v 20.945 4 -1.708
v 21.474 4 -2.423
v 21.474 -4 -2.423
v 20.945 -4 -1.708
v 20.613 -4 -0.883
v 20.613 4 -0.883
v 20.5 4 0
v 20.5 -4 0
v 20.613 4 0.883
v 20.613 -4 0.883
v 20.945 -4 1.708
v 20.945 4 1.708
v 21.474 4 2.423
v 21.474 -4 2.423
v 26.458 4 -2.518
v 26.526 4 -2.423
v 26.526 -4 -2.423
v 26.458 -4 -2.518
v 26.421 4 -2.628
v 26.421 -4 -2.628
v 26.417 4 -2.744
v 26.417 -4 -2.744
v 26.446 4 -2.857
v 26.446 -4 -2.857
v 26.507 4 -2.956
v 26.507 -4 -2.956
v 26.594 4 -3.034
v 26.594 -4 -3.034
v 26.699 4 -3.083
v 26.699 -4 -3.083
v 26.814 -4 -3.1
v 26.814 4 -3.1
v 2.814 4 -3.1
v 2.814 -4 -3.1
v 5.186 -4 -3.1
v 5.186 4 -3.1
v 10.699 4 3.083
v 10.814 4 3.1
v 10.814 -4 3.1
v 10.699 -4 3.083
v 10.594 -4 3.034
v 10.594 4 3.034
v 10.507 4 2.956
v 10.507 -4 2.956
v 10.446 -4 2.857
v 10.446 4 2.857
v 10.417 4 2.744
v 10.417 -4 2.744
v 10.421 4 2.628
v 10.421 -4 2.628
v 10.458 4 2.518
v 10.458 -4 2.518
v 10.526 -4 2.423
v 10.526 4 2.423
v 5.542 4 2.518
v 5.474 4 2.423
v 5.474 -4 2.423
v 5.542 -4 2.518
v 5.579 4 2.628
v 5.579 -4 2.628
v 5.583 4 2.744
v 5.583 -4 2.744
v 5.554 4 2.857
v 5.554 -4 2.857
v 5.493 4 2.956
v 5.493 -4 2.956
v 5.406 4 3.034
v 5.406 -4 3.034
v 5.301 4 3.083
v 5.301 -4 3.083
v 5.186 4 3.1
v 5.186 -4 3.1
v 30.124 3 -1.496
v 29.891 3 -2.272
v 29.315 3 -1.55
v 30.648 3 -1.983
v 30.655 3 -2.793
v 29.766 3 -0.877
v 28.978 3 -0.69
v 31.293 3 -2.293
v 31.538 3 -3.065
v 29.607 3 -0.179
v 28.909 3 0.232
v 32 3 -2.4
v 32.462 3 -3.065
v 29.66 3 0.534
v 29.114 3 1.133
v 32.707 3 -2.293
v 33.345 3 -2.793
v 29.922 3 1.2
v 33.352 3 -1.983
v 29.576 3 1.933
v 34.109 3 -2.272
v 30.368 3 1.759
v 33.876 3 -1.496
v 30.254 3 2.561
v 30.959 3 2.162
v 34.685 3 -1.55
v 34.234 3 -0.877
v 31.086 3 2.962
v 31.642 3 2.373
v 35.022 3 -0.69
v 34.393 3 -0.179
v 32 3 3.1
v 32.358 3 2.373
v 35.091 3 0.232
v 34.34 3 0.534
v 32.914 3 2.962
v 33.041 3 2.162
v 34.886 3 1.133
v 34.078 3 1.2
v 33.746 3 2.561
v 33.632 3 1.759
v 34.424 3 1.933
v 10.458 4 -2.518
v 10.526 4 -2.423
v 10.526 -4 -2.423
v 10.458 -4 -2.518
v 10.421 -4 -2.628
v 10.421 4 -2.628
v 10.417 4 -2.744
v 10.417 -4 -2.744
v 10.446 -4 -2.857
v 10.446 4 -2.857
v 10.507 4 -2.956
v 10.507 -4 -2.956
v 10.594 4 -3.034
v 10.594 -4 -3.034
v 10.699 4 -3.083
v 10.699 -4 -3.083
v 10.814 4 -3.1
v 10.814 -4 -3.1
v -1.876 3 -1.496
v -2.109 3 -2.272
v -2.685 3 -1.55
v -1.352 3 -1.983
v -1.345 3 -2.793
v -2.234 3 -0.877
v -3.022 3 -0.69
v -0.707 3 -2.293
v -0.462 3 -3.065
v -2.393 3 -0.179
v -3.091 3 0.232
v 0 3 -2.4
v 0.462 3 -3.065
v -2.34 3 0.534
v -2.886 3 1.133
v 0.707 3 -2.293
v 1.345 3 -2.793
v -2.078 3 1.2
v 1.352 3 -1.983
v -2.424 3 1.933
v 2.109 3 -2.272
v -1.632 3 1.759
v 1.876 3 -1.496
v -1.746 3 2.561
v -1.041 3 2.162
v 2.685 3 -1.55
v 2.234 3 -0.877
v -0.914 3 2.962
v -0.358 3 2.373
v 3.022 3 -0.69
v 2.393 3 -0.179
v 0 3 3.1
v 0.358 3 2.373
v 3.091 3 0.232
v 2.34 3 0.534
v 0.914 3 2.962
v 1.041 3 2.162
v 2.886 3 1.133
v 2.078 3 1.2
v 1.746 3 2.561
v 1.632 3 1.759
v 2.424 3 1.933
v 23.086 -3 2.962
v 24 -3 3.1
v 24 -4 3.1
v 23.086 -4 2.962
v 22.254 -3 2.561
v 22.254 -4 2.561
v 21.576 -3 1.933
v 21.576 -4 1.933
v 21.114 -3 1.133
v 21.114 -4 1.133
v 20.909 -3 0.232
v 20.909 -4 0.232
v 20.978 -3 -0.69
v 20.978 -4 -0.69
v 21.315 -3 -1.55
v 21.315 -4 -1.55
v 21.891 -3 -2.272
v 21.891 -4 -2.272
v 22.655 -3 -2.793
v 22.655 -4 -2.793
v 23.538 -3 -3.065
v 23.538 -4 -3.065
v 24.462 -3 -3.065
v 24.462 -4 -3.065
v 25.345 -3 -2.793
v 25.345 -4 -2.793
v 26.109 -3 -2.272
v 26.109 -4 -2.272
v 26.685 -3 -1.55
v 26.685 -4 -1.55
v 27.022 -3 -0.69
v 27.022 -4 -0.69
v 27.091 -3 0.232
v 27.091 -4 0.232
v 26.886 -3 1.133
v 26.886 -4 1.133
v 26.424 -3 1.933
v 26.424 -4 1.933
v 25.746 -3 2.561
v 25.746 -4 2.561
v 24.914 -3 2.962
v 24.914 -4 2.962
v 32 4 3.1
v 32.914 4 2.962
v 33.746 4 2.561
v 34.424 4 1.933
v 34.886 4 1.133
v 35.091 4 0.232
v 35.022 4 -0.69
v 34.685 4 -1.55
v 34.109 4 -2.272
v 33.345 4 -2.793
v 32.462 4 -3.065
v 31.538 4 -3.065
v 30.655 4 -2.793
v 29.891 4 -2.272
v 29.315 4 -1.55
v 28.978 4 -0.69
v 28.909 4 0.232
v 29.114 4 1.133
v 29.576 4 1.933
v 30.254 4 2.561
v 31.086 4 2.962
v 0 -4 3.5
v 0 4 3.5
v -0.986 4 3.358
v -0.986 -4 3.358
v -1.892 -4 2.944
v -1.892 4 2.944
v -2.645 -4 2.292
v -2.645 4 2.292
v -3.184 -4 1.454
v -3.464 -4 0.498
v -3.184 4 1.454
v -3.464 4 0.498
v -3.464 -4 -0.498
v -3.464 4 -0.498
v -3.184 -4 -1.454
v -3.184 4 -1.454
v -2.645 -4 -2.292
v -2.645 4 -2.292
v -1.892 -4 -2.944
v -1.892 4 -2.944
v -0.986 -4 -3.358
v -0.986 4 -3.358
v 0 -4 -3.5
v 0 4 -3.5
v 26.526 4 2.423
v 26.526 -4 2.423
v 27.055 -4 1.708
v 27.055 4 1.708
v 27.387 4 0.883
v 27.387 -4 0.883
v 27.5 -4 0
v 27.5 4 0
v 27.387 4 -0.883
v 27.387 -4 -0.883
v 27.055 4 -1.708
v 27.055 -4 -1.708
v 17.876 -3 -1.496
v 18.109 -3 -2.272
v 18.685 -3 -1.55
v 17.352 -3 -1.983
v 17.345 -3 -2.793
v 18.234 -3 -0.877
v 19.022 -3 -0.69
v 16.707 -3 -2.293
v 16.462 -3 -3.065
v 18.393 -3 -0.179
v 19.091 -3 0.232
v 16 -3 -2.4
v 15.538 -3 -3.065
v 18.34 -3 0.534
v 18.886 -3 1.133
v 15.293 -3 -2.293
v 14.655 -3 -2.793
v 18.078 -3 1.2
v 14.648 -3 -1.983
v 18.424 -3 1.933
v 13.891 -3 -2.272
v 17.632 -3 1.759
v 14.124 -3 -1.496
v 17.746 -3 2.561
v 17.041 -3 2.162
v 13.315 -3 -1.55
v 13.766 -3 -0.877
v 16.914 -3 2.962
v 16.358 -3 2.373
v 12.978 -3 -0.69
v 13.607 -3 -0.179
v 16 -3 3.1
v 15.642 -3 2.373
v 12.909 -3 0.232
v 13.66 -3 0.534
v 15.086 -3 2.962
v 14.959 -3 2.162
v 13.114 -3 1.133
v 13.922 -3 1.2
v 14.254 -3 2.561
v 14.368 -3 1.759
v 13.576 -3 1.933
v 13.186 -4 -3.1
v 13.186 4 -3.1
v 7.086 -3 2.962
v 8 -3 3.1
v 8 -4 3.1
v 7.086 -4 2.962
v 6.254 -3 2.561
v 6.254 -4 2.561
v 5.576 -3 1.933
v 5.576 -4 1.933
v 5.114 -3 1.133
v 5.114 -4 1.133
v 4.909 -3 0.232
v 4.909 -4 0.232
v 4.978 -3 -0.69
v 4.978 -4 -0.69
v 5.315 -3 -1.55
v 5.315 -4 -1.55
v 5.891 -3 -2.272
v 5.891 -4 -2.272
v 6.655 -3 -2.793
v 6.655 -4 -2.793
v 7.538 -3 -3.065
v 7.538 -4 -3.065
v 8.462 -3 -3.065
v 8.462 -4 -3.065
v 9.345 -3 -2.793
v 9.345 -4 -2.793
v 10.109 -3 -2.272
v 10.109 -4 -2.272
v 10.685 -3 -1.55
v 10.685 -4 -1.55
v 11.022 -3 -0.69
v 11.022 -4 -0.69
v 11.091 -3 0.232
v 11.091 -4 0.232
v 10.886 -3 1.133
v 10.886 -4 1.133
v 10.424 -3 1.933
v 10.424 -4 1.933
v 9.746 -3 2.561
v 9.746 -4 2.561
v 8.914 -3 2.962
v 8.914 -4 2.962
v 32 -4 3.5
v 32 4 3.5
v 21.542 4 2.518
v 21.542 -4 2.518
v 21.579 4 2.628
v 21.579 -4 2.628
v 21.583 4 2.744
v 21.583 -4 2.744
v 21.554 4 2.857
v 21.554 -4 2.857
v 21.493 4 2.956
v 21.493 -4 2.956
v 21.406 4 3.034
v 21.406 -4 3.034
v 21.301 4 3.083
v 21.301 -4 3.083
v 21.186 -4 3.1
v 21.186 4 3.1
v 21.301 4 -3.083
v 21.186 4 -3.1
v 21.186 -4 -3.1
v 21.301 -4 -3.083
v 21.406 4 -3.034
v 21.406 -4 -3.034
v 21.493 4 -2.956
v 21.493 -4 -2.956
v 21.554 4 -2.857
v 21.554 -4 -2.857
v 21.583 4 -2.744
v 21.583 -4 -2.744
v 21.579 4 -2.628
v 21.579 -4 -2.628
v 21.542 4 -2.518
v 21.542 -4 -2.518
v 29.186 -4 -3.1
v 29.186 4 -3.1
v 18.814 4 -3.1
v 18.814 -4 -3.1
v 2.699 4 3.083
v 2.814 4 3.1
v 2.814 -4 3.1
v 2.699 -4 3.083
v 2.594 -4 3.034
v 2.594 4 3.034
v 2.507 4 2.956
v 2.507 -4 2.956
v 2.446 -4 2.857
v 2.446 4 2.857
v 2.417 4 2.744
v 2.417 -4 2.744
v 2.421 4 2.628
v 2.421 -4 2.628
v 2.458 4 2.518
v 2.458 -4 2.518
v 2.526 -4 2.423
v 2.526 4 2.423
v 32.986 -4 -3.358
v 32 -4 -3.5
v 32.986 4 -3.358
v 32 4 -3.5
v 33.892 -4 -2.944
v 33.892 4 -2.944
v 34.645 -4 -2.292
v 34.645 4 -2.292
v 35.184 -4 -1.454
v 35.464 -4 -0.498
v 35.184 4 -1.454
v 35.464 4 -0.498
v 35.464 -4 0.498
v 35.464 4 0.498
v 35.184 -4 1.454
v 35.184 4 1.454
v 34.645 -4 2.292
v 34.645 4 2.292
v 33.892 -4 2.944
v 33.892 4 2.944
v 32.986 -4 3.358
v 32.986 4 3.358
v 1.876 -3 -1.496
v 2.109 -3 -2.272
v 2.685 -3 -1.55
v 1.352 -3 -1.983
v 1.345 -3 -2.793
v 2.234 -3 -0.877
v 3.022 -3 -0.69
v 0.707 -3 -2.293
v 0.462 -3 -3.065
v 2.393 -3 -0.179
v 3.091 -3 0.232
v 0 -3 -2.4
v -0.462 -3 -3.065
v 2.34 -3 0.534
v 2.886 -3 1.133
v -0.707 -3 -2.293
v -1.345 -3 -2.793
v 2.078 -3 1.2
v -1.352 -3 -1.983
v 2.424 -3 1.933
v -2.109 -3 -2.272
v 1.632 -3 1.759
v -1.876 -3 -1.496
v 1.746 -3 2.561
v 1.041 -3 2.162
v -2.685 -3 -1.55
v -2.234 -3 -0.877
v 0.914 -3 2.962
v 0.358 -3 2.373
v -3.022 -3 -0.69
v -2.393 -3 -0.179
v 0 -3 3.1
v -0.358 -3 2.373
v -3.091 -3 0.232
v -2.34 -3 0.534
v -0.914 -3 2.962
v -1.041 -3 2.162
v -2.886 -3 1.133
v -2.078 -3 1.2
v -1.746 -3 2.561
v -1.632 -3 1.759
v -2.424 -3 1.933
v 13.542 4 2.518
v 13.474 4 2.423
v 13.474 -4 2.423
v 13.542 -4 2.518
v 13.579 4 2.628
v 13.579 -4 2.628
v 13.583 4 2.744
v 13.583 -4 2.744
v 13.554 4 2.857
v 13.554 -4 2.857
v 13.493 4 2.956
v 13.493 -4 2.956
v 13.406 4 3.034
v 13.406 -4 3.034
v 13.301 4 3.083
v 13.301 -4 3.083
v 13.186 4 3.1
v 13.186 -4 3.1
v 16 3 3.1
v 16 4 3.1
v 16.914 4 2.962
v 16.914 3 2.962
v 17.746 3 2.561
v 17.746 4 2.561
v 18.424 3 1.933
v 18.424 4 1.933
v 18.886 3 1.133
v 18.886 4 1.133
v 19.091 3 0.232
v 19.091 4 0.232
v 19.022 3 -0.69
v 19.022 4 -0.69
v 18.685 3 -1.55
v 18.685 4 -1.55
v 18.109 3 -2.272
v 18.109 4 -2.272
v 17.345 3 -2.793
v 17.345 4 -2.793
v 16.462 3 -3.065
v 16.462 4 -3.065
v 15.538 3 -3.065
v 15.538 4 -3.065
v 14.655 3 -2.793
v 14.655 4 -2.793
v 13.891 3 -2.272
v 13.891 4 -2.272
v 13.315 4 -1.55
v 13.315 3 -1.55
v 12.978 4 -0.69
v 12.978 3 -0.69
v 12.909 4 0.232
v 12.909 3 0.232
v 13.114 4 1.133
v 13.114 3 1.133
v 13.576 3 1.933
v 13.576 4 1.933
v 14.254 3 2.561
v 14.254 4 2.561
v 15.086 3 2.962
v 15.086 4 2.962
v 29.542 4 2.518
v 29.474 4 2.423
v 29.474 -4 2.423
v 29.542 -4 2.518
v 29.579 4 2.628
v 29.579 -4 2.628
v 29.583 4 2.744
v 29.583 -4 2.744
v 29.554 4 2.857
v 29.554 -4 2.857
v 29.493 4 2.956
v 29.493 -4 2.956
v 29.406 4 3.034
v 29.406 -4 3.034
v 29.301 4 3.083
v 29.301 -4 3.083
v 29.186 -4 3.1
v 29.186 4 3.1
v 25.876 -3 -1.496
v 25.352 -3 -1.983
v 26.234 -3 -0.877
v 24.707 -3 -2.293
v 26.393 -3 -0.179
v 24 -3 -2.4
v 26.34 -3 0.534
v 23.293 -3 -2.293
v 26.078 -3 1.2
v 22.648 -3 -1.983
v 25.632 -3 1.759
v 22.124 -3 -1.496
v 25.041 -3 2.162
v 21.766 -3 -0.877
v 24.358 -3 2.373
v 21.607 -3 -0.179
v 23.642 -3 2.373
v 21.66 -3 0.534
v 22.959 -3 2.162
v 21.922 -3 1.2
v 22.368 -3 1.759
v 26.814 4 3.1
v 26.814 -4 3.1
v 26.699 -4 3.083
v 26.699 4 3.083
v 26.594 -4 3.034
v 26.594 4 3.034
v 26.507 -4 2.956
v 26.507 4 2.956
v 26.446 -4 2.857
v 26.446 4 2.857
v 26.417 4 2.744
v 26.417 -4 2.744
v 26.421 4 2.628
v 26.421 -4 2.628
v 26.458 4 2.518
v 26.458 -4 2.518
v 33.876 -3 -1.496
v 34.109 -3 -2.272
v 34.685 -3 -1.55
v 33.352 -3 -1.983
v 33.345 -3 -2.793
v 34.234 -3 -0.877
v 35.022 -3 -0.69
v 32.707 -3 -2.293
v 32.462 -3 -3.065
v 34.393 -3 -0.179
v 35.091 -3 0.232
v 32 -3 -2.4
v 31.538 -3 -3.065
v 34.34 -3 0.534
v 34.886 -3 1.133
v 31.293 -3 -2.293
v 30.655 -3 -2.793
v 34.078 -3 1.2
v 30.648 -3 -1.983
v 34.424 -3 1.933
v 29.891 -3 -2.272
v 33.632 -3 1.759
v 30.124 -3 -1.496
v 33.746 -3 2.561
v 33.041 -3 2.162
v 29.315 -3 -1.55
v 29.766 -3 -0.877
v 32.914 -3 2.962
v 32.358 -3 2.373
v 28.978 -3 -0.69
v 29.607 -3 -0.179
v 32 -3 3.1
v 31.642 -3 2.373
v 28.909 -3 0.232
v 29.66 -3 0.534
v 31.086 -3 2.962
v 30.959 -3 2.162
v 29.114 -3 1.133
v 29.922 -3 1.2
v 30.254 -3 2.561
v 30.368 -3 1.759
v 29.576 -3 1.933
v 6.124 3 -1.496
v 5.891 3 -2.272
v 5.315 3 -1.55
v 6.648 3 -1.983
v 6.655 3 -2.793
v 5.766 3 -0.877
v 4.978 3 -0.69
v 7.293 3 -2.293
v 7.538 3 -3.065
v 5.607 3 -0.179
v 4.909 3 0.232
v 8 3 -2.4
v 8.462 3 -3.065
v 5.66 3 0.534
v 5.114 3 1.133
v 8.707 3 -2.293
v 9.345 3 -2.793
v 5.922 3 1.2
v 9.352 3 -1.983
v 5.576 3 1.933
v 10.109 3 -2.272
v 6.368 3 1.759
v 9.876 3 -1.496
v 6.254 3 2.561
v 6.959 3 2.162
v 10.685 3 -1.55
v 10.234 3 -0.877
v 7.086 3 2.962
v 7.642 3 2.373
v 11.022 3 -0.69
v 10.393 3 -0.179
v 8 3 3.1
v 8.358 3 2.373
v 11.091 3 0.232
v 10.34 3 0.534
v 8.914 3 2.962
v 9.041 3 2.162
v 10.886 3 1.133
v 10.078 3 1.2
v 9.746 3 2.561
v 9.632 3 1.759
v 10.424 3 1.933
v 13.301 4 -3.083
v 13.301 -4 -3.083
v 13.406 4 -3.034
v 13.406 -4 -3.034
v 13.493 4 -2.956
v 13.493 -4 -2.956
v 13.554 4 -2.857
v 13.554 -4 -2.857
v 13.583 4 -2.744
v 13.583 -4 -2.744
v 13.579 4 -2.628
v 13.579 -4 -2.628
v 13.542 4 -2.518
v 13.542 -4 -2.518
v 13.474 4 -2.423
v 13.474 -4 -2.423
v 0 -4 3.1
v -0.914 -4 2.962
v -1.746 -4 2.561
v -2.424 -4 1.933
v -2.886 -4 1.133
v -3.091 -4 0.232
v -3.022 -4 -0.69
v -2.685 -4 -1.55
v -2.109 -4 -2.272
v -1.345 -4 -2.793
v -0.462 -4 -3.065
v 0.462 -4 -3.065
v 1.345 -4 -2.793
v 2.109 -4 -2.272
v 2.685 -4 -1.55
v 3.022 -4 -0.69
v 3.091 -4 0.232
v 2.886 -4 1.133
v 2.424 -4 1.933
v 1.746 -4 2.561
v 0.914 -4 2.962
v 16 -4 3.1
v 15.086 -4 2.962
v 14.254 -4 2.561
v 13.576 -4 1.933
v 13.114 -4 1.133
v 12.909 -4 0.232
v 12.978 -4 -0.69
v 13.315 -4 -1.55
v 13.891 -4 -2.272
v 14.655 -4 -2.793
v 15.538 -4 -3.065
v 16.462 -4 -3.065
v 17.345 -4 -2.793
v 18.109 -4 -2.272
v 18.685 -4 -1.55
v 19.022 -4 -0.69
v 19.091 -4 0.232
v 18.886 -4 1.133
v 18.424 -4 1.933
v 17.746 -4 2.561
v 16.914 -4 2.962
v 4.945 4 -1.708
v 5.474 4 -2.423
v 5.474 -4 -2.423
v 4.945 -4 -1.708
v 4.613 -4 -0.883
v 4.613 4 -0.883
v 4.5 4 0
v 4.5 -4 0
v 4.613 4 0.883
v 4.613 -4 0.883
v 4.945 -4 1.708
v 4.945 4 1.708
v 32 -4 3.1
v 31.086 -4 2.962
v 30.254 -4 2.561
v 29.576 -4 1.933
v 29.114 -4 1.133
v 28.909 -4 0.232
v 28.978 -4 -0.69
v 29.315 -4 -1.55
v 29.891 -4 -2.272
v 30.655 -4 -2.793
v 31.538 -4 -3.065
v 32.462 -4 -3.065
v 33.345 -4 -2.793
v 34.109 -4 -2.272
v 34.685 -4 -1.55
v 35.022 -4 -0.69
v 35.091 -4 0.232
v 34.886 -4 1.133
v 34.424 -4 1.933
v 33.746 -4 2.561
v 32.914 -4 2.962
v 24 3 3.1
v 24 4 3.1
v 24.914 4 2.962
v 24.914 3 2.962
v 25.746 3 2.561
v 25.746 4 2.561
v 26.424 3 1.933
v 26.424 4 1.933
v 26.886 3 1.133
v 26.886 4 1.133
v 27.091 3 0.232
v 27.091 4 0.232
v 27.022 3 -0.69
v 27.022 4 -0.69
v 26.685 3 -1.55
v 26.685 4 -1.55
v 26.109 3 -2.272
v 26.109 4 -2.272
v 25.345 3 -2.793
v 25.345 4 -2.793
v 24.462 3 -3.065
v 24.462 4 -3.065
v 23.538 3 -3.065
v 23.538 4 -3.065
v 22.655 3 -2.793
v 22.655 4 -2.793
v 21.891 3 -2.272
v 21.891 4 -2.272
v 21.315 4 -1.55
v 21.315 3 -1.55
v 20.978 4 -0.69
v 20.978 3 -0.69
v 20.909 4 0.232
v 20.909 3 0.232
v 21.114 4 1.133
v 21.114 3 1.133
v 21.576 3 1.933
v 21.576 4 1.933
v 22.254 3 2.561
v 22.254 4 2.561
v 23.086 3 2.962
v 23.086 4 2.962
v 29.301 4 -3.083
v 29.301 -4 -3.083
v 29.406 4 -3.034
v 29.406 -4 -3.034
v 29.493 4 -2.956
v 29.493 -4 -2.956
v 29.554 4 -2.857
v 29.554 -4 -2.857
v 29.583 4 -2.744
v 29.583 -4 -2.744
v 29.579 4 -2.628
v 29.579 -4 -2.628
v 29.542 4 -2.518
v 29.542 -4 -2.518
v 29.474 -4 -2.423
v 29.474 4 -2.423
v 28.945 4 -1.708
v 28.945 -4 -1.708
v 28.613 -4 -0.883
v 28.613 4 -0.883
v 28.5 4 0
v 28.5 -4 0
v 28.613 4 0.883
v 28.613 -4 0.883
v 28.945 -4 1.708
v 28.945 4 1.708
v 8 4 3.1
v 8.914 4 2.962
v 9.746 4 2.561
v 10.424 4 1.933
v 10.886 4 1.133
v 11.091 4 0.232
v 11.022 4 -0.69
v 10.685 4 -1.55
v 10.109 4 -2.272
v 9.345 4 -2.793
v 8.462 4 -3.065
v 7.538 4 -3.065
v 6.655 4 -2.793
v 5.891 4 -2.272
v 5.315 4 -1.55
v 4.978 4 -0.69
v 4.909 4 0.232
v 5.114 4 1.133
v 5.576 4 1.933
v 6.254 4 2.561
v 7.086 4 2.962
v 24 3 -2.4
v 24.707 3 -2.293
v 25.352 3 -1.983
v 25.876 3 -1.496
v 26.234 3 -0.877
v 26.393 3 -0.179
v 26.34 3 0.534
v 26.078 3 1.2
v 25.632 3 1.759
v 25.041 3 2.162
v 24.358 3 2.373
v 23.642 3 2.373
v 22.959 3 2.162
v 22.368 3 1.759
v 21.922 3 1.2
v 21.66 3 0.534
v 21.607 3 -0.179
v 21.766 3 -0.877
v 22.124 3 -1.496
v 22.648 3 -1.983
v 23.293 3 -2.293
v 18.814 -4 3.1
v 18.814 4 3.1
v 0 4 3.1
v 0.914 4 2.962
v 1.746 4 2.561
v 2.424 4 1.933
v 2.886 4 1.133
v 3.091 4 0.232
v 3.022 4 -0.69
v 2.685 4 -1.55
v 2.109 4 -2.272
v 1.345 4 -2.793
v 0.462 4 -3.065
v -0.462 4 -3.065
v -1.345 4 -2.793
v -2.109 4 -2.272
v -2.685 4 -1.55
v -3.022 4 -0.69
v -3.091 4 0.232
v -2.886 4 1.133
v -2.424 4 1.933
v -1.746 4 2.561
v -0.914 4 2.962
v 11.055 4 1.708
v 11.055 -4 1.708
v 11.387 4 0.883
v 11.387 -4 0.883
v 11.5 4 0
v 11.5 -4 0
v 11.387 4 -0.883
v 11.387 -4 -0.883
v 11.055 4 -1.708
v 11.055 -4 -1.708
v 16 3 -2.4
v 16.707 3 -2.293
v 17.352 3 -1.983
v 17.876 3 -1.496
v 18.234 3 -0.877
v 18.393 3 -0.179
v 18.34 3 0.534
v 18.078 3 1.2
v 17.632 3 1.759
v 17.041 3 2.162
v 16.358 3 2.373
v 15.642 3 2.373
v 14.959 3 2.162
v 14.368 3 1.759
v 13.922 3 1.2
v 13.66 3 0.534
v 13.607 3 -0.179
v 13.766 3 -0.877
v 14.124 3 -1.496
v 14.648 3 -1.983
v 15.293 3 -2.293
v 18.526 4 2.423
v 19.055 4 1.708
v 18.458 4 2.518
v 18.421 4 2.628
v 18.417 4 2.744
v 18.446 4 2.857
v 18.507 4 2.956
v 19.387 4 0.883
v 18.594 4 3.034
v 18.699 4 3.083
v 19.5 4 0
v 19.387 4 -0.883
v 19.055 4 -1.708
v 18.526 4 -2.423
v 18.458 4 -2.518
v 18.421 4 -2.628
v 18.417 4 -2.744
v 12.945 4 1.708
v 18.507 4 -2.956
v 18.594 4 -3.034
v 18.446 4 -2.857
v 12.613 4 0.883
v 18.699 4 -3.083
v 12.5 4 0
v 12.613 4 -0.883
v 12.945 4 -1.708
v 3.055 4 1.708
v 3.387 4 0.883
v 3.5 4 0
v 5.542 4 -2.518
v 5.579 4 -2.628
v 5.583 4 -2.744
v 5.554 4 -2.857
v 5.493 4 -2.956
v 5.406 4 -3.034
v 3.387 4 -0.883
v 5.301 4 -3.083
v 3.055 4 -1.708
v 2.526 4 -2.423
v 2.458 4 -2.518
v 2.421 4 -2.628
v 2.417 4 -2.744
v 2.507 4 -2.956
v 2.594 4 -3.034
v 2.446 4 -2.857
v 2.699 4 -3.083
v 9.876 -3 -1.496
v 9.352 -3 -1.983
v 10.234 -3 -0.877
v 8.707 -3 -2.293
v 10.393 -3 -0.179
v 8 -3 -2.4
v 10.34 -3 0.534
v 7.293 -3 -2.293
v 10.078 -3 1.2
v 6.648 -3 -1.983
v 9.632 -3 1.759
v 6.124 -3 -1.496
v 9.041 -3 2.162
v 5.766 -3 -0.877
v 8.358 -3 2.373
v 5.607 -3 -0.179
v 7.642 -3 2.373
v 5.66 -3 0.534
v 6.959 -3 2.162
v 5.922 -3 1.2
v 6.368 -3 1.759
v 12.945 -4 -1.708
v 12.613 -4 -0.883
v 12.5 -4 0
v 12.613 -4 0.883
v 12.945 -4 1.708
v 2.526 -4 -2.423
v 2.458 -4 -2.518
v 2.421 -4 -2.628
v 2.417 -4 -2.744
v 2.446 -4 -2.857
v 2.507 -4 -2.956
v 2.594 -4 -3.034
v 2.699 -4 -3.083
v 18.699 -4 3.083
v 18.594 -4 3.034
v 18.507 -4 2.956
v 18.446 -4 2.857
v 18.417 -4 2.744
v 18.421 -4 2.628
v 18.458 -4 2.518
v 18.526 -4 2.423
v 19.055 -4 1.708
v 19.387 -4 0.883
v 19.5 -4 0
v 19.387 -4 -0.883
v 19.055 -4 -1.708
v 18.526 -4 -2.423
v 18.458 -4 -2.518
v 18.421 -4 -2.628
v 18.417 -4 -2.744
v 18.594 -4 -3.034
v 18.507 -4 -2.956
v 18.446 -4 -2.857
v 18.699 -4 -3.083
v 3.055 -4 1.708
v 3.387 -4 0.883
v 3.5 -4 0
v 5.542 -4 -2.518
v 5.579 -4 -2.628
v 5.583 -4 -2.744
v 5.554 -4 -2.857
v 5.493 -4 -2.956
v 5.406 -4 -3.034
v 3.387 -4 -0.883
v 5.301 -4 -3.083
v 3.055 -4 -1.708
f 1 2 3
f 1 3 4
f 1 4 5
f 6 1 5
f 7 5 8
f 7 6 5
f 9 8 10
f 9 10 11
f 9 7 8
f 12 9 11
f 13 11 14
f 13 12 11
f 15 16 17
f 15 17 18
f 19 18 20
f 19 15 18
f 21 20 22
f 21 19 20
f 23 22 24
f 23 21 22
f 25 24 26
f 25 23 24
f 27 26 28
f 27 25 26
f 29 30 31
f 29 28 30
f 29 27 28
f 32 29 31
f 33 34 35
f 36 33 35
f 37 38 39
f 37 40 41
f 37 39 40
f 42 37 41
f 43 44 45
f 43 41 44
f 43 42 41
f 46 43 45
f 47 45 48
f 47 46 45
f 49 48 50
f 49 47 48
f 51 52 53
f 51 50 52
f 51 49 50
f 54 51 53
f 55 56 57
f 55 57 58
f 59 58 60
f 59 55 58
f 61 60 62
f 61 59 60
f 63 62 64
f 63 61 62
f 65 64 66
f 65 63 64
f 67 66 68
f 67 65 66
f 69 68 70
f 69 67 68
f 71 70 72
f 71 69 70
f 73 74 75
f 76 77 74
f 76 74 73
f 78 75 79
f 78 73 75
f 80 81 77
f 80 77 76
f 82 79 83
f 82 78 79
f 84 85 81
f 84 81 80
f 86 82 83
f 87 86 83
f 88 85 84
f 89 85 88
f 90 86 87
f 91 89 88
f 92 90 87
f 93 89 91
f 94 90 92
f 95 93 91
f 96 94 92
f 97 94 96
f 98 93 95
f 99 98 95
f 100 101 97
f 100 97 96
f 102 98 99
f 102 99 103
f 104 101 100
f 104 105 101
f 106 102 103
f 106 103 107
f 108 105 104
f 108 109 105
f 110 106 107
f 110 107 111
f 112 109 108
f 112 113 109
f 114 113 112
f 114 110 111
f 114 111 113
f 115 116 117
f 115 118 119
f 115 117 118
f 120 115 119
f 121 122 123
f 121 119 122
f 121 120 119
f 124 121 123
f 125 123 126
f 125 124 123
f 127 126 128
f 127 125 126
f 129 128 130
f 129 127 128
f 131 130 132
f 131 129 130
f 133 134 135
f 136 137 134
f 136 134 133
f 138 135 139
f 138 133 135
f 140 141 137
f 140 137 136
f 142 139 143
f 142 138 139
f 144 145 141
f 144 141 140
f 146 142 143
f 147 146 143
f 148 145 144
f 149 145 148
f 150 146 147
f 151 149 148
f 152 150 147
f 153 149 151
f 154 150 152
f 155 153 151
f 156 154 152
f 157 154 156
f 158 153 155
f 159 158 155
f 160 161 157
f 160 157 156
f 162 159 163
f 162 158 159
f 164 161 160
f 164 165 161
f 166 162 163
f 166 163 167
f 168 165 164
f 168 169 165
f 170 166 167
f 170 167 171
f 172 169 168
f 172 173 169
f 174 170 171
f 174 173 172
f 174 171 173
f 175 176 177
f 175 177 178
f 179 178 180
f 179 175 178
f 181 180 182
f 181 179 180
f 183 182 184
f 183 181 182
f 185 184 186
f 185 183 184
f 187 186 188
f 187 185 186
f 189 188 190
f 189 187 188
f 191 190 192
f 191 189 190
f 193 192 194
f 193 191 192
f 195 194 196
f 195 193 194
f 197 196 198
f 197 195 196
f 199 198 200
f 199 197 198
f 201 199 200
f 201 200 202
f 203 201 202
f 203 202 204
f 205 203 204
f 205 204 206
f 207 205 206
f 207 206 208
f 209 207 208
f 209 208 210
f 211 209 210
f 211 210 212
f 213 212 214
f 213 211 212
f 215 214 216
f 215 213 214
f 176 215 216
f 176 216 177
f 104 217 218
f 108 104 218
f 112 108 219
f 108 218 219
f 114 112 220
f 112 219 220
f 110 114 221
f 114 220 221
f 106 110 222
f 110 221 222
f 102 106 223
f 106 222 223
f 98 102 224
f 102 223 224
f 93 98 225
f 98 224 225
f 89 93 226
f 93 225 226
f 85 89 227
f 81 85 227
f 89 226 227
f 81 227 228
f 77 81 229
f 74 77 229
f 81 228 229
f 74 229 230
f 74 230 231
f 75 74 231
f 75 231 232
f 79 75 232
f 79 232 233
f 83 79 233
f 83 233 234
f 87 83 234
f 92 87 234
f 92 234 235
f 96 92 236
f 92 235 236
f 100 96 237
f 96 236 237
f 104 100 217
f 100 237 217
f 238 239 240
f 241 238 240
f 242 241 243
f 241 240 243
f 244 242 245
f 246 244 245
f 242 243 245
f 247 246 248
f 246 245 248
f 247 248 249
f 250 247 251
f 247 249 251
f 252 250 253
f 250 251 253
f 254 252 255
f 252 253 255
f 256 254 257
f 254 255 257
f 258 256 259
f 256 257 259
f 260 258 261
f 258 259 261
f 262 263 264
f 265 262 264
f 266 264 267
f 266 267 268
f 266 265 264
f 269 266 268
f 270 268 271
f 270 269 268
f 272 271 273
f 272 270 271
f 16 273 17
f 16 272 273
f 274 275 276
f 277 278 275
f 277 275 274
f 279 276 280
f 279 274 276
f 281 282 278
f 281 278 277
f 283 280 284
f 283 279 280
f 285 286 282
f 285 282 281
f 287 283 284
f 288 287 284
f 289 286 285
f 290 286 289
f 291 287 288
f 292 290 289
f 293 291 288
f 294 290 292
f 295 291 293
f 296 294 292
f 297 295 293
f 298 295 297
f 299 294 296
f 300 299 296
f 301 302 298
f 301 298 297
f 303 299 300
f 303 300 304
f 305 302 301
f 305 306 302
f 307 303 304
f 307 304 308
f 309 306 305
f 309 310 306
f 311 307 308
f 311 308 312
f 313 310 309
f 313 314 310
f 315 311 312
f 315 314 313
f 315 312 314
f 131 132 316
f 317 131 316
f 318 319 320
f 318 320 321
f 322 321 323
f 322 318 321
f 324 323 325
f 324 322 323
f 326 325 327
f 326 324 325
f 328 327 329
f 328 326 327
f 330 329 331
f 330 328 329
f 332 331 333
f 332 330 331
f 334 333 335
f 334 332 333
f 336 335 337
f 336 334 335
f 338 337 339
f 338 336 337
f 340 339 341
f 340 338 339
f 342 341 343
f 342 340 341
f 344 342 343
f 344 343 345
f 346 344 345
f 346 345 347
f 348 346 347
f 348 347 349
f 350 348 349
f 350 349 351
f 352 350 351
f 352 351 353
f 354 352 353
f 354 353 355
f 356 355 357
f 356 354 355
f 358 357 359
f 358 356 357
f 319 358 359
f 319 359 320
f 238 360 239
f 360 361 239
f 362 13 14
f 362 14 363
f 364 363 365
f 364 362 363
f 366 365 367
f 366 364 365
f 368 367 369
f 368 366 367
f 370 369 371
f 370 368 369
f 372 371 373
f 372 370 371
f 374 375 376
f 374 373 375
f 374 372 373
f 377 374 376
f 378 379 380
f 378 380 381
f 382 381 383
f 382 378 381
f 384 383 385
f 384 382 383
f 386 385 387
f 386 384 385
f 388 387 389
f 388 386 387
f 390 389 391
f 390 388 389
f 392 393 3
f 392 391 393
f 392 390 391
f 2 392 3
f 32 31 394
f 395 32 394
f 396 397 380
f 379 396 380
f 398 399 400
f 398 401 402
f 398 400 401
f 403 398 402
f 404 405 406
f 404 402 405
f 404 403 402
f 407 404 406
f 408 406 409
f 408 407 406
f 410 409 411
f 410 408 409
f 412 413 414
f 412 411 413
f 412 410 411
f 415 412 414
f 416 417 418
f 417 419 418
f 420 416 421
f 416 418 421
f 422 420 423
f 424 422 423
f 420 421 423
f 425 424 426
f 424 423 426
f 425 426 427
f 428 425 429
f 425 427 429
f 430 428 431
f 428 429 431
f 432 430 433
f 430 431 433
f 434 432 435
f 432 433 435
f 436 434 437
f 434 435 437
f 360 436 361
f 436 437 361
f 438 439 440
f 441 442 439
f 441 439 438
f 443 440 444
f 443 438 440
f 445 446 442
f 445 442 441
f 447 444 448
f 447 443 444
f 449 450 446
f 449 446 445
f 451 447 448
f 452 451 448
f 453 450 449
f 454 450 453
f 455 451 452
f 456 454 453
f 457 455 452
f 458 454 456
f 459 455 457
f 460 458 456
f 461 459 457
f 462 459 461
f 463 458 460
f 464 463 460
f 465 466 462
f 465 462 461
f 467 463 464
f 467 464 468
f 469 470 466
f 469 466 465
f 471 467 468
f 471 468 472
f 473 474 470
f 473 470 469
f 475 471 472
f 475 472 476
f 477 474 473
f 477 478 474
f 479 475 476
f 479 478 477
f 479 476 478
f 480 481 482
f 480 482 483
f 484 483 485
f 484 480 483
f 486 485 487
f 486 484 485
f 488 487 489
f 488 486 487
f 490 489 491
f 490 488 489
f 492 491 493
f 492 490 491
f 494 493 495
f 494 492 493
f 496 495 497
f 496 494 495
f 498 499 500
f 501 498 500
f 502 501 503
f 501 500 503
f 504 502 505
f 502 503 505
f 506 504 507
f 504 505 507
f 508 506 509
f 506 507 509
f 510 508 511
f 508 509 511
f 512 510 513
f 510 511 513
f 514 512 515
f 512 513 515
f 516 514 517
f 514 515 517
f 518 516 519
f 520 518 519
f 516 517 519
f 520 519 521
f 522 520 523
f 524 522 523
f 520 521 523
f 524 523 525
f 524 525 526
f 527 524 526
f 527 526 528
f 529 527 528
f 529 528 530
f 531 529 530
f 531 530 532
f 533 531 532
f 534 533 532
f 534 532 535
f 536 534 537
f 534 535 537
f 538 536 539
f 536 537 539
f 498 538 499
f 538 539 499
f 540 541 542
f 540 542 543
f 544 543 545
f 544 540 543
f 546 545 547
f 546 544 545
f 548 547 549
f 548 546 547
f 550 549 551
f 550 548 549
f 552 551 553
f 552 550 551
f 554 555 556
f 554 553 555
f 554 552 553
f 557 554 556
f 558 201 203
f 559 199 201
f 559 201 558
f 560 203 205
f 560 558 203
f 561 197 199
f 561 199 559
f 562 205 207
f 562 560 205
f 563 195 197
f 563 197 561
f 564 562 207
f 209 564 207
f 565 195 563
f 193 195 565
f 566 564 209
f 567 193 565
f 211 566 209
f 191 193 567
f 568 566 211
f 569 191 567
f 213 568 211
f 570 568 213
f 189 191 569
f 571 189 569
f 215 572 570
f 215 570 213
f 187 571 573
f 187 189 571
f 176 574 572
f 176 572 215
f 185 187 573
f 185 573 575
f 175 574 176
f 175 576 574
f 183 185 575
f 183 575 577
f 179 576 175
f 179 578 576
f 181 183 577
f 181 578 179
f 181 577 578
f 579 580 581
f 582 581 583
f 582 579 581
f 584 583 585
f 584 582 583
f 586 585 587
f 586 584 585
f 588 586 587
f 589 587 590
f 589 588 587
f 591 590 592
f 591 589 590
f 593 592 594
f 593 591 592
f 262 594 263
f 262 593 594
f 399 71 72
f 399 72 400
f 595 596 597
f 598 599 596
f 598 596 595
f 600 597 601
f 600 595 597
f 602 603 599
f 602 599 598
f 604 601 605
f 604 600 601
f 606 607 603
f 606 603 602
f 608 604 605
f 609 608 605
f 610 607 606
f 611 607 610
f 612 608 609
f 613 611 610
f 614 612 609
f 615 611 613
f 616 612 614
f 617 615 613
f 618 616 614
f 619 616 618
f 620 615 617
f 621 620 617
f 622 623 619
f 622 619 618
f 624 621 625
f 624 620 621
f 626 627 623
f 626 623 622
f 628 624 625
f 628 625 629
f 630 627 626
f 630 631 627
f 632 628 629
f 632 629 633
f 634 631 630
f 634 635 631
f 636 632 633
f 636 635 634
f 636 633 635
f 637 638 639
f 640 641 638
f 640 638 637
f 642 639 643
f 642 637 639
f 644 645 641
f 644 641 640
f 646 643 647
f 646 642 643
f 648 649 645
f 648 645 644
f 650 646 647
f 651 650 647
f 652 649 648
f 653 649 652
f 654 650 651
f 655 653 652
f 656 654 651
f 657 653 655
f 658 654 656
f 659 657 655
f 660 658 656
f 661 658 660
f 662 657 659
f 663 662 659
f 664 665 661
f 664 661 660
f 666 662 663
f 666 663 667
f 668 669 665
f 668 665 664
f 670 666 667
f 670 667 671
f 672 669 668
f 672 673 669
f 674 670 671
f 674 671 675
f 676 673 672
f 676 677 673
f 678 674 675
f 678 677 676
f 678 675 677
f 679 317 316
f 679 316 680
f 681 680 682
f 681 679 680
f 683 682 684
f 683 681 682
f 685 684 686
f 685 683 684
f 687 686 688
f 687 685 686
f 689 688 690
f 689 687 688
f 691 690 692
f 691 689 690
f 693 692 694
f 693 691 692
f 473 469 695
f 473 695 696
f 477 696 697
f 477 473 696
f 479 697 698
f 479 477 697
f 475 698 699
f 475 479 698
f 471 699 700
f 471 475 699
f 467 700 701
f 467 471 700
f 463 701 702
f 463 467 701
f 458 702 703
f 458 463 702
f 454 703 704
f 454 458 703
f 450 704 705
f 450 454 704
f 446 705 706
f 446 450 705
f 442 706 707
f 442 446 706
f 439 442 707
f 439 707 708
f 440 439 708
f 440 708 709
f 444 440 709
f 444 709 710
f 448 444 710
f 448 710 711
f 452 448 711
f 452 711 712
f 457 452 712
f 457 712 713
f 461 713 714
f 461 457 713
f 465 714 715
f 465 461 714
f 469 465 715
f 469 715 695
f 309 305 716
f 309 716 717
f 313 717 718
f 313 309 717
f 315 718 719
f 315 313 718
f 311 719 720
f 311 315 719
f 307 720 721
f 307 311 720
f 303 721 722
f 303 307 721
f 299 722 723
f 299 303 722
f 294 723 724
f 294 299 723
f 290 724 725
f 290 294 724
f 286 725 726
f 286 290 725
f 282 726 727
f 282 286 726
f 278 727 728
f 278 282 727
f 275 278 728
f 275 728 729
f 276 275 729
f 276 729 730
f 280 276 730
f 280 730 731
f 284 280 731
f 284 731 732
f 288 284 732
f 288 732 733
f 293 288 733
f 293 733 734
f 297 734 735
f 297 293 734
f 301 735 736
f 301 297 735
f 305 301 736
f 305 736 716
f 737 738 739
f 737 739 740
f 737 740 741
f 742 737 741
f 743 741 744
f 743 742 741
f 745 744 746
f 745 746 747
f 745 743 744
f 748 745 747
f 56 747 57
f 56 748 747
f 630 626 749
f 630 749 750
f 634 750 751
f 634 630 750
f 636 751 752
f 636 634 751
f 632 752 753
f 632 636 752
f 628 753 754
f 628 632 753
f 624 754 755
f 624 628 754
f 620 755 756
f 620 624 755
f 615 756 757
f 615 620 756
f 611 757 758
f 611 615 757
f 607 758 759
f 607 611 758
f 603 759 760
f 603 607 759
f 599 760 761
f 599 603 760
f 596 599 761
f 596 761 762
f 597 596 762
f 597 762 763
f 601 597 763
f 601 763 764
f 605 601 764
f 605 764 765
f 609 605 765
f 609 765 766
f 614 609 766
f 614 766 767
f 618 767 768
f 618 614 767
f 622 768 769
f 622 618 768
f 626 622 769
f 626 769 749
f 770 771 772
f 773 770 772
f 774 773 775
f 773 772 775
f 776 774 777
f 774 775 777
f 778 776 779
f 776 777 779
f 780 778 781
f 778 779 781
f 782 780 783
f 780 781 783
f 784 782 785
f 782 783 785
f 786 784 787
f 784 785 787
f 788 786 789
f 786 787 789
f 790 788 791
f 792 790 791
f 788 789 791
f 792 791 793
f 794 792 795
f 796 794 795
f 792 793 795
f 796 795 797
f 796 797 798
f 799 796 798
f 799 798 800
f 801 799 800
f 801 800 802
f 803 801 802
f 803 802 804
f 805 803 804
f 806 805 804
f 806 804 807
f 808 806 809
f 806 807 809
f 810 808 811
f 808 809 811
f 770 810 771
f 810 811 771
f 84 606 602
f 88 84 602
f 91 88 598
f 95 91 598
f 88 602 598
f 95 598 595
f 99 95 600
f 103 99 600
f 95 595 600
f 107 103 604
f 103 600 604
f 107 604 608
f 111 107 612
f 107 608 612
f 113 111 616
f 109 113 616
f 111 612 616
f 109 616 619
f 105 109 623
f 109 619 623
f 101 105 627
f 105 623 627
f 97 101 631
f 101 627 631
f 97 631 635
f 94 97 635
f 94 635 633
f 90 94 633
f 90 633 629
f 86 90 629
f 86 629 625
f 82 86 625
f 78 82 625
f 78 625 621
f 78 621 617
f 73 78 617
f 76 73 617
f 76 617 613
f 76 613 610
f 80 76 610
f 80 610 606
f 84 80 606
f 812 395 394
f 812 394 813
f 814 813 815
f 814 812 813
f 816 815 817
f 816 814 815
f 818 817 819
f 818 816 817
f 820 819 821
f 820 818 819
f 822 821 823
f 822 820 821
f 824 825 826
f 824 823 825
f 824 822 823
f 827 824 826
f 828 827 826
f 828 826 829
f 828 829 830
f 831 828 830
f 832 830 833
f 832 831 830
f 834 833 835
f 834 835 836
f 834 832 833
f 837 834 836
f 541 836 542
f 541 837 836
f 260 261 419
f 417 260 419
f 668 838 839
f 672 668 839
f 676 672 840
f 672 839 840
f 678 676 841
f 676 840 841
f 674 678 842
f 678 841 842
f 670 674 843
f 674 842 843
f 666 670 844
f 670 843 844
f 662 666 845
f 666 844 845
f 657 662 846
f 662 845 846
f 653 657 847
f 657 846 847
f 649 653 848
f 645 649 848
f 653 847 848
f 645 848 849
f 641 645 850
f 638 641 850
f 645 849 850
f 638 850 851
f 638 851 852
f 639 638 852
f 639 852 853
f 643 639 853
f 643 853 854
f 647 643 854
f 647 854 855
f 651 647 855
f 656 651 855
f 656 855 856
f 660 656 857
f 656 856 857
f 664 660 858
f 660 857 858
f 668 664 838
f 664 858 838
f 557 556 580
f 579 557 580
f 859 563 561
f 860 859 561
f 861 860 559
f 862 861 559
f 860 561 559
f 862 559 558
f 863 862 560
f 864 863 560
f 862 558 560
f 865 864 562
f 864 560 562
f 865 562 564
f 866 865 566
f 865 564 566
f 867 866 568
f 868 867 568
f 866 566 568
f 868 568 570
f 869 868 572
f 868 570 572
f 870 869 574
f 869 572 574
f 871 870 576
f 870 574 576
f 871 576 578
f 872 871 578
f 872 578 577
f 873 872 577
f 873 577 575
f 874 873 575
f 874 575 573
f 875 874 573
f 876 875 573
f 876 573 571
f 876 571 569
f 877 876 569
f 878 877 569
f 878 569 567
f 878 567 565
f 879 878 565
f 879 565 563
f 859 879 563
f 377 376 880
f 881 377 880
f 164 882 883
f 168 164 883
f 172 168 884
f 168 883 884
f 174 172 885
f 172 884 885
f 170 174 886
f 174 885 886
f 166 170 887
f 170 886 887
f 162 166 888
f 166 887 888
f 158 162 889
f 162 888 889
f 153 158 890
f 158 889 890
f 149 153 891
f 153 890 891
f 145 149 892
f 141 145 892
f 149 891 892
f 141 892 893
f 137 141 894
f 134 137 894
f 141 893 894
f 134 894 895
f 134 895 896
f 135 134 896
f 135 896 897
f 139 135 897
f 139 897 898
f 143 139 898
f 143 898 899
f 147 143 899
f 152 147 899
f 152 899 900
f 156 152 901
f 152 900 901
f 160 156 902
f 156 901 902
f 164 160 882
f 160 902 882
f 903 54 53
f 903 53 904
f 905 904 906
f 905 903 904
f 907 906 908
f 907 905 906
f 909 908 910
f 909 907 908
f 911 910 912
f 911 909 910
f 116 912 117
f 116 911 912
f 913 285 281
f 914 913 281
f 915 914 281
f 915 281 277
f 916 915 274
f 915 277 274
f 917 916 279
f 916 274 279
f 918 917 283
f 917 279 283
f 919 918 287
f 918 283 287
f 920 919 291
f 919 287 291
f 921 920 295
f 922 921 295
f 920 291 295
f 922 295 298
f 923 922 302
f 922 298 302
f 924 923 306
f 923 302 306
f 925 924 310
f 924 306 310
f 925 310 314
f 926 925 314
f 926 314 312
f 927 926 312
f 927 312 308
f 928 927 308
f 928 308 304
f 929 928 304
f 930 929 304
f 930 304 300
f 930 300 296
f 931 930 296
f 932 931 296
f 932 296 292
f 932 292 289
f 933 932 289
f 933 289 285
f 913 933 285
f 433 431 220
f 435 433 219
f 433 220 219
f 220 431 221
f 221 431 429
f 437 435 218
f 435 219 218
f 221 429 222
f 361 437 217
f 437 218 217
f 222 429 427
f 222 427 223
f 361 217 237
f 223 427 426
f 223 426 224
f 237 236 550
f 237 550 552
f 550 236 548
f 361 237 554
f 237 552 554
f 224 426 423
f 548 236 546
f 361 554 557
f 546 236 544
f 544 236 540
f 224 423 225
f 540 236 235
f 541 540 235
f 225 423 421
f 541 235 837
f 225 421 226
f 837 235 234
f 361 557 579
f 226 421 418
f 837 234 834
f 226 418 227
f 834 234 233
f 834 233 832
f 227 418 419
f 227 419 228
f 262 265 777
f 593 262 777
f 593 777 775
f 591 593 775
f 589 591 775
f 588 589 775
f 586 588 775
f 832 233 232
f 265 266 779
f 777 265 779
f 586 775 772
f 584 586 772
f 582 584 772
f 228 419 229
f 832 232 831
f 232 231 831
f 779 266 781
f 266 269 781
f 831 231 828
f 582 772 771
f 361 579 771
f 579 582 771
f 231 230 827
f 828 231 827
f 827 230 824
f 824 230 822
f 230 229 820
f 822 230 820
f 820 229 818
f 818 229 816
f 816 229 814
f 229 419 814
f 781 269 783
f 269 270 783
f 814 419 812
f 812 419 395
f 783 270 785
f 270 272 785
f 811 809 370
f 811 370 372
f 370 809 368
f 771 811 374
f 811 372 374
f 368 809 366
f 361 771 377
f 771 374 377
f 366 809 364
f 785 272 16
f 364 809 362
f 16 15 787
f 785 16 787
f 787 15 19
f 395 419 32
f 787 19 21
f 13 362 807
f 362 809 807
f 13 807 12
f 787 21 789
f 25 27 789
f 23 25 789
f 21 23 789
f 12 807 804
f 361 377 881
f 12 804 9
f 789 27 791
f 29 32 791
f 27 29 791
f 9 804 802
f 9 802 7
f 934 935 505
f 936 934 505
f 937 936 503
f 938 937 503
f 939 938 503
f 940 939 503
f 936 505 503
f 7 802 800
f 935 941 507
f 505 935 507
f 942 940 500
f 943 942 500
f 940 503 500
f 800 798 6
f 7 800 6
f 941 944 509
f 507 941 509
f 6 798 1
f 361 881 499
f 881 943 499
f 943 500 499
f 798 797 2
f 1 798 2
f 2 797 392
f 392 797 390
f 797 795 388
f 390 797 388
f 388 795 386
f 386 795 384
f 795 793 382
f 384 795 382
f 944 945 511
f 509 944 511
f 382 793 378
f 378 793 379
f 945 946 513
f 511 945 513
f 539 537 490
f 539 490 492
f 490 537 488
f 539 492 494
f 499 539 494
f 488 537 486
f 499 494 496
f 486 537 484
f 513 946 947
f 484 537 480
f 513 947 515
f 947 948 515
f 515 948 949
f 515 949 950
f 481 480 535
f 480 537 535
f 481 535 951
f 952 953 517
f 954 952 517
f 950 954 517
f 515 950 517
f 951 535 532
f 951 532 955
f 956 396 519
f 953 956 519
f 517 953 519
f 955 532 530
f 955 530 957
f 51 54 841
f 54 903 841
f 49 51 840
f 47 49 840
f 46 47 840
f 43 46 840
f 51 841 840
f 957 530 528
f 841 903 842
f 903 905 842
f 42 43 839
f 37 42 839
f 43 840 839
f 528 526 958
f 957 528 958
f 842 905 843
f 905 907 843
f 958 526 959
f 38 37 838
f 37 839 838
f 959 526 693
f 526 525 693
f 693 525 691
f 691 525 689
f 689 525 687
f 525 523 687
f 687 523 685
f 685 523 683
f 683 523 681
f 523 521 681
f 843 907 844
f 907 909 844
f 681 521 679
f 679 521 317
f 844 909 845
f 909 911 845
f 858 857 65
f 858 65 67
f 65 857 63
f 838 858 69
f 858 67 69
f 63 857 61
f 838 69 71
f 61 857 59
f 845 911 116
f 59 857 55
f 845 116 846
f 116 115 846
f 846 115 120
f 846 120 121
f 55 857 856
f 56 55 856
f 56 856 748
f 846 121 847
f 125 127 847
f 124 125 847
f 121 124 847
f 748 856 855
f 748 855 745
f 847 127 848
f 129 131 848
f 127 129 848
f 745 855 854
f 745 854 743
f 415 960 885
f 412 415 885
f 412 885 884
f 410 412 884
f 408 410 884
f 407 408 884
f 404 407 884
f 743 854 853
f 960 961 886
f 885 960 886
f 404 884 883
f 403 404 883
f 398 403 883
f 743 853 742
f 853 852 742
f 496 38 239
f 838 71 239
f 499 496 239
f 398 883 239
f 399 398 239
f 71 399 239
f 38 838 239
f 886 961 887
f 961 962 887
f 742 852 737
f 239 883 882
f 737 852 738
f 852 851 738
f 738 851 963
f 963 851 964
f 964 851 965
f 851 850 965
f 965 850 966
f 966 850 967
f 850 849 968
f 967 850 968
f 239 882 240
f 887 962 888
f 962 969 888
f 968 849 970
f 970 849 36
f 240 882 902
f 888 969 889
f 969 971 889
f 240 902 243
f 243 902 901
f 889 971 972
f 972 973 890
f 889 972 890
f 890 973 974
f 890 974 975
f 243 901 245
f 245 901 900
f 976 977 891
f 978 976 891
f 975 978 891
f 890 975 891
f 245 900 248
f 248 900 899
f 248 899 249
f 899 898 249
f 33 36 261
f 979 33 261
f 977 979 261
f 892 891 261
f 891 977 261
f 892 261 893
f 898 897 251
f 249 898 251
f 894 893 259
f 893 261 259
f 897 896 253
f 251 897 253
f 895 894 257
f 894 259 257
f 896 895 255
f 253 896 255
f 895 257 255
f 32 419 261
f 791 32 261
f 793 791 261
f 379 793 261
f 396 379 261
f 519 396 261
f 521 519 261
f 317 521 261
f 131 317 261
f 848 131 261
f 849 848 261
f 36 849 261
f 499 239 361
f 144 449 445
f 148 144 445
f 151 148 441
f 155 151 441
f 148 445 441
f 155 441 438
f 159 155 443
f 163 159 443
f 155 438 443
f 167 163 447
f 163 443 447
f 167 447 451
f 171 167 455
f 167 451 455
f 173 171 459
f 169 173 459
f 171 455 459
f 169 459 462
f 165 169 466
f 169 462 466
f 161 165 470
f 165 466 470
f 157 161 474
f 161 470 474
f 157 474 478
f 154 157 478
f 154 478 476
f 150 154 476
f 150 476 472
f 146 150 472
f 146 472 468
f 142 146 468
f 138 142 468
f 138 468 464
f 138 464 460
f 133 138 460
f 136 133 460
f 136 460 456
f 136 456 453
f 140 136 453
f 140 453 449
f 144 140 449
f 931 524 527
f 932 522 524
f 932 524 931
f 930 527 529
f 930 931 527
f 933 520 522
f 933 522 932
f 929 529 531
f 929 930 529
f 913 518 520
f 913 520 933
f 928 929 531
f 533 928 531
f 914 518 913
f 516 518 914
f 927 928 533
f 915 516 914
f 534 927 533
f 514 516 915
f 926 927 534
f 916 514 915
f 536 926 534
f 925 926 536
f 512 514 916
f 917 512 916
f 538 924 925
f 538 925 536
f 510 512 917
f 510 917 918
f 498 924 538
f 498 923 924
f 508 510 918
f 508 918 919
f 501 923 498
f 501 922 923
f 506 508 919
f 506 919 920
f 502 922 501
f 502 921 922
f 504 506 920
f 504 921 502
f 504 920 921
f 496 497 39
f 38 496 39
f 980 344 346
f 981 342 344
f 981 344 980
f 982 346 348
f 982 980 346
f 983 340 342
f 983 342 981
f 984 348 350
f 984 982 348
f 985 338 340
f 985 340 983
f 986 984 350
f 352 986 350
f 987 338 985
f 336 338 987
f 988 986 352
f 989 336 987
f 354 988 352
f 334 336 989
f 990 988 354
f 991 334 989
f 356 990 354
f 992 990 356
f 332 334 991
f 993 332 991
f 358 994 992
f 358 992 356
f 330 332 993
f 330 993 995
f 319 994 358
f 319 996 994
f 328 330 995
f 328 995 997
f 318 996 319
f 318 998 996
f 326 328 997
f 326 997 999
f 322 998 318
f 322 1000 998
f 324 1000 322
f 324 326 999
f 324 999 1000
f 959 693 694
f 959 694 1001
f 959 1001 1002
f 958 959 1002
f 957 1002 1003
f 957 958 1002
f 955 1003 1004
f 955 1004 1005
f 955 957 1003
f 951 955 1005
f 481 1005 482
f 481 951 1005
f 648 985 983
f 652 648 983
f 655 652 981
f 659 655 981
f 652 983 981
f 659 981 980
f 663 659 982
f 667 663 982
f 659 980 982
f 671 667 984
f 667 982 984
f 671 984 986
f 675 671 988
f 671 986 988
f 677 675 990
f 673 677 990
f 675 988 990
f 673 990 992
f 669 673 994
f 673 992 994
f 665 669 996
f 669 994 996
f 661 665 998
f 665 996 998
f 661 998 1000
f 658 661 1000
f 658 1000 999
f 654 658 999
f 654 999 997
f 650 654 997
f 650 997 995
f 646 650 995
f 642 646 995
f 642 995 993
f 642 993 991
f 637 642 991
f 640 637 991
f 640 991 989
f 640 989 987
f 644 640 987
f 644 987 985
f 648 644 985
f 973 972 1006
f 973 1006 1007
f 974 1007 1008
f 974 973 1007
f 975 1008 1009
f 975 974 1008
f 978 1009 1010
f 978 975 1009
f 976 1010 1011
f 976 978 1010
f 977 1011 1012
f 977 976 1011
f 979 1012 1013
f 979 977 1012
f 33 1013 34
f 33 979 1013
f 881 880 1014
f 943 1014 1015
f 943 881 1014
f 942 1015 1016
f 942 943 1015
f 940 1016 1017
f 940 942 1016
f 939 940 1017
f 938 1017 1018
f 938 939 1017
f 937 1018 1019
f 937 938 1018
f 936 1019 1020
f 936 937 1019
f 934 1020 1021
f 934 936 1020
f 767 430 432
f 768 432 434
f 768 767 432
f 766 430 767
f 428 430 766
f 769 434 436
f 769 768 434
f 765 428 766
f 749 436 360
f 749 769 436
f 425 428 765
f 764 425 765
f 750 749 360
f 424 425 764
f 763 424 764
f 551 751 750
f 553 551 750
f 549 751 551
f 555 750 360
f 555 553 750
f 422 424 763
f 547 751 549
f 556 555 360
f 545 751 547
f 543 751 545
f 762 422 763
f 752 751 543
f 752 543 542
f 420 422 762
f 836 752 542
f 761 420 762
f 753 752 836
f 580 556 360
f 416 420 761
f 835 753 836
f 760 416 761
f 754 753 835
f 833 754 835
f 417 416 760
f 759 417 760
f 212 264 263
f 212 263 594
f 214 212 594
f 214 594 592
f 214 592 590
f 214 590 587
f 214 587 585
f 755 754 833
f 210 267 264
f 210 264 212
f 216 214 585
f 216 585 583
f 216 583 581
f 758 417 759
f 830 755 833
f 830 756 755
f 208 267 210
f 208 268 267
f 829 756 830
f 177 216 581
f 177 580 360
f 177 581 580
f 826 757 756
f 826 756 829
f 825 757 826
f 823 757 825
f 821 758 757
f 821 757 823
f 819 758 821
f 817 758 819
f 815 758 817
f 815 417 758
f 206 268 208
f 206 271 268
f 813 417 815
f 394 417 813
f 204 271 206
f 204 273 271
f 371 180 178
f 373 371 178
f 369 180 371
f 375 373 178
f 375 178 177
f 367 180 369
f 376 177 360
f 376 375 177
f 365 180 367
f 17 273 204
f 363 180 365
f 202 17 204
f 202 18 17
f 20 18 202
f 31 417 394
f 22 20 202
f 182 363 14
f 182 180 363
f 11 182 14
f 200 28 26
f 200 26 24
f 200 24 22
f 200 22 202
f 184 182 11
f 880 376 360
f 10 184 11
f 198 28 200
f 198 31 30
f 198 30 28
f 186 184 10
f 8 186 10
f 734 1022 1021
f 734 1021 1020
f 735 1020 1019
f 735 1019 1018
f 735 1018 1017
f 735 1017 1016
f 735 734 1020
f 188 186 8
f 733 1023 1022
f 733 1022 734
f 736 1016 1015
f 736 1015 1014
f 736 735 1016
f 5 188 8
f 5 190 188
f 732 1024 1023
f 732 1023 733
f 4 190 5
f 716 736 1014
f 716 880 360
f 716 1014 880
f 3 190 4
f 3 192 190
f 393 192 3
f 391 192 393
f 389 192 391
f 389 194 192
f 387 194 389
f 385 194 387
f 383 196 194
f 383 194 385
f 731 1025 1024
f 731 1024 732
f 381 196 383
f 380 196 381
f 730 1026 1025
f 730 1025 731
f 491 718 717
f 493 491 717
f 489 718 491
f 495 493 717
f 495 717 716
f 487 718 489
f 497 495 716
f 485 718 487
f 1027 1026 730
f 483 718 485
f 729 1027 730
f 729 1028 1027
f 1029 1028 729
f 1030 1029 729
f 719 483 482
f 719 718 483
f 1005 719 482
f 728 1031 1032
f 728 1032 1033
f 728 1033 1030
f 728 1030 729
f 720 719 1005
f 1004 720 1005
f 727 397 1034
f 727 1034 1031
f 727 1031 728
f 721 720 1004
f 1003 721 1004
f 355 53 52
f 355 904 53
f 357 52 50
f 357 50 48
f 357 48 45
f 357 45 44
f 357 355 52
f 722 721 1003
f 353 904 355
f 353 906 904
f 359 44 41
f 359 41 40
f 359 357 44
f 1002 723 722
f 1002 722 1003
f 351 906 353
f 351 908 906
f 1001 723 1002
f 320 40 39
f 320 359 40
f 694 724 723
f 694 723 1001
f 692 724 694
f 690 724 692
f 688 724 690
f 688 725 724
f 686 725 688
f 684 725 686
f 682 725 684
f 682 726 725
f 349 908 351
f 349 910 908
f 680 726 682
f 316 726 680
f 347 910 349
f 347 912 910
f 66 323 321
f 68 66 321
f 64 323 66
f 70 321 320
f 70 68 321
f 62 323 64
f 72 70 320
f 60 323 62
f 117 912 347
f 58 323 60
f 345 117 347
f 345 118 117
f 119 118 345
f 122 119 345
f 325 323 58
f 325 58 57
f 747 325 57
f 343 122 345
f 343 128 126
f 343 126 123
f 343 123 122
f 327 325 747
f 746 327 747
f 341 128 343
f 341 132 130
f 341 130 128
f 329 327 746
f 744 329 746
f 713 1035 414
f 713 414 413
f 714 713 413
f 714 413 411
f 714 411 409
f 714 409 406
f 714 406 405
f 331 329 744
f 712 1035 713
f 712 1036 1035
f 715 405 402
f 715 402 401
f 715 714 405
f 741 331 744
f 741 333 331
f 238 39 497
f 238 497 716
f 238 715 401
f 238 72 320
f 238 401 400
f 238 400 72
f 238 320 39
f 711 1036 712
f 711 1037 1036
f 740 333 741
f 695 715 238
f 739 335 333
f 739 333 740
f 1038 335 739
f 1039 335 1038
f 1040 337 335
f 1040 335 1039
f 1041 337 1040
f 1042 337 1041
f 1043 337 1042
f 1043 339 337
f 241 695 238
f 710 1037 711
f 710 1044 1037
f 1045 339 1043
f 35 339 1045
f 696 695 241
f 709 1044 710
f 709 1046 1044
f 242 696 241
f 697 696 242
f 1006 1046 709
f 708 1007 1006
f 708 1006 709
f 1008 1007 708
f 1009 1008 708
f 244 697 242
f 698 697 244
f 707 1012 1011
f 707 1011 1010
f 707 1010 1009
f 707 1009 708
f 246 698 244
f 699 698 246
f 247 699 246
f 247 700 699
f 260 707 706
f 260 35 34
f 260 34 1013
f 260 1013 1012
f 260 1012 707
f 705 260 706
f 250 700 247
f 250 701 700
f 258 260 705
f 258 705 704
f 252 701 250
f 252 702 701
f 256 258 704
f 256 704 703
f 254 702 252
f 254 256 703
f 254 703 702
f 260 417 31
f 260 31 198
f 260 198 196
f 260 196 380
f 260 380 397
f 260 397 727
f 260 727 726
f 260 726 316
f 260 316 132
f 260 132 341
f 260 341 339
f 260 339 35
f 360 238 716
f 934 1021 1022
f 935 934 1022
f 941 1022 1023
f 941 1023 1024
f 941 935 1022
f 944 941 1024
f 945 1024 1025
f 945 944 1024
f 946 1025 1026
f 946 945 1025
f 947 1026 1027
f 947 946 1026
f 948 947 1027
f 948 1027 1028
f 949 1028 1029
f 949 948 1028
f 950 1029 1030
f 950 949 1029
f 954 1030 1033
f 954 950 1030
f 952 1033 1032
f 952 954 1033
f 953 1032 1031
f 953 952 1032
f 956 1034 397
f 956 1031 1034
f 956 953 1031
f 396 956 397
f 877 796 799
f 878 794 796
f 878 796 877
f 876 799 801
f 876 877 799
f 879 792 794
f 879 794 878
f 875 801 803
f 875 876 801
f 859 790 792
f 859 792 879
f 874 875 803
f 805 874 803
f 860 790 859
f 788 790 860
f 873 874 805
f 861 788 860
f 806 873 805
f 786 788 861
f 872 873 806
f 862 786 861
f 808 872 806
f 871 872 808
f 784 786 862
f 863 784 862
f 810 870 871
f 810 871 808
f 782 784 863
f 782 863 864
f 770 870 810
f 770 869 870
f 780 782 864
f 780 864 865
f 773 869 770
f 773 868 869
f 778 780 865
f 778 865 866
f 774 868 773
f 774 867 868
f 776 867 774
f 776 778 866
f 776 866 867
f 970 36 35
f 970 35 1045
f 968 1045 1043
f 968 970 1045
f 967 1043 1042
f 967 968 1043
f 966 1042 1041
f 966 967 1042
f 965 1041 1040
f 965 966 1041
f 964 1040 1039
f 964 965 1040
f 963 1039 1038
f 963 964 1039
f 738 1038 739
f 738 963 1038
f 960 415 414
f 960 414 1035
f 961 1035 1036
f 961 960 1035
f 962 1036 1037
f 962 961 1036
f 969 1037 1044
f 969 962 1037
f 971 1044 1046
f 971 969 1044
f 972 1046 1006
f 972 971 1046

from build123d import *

# Parameters (mm, degrees)
BOSS_EXTRUDE1_DEPTH = 4
SKETCH3_R           = 3.1
CUT_EXTRUDE1_DEPTH  = 1
CUT_EXTRUDE2_START  = -1
SKETCH4_R           = 3.1
CUT_EXTRUDE2_DEPTH  = 1
SKETCH5_R           = 2.4
CUT_EXTRUDE3_DEPTH  = 37.558172821
LPATTERN2_COUNT     = 5
LPATTERN2_PITCH     = 8
CUT_EXTRUDE4_DEPTH  = 36.895682192
LPATTERN3_COUNT     = 4
LPATTERN3_PITCH     = 8


with BuildPart() as part:
    # Sketch2 → Boss-Extrude1 (new, symmetric)
    with BuildSketch(Plane(origin=(0, 0, 0), x_dir=(1, 0, 0), z_dir=(0, 1, 0))):
        with BuildLine():
            Line((0, 3.5), (32, 3.5))
            ThreePointArc((32, 3.5), (35.5, 0), (32, -3.5))
            Line((32, -3.5), (0, -3.5))
            ThreePointArc((0, -3.5), (-3.5, 0), (0, 3.5))
        make_face()
    extrude(amount=BOSS_EXTRUDE1_DEPTH, both=True)

    # Sketch3 → Cut-Extrude1 (cut)
    with BuildSketch(Plane(origin=(0, 4, 0), x_dir=(1, 0, 0), z_dir=(0, 1, 0))):
        with Locations(Location((0, 0, 0), (0, 0, 270))):
            Circle(SKETCH3_R)
    cut_extrude1 = extrude(amount=-CUT_EXTRUDE1_DEPTH, mode=Mode.SUBTRACT)

    # Sketch4 → Cut-Extrude2 (cut)
    with BuildSketch(Plane(origin=(0, -4, 0), x_dir=(-1, 0, 0), z_dir=(0, -1, 0)).offset(CUT_EXTRUDE2_START)):
        with Locations(Location((0, 0, 0), (0, 0, 270))):
            Circle(SKETCH4_R)
    cut_extrude2 = extrude(amount=CUT_EXTRUDE2_DEPTH, mode=Mode.SUBTRACT)

    # Sketch5 → Cut-Extrude3 (cut, through all)
    with BuildSketch(Plane(origin=(0, -4, 0), x_dir=(-1, 0, 0), z_dir=(0, -1, 0))):
        with Locations(Location((0, 0, 0), (0, 0, 90))):
            Circle(SKETCH5_R)
    cut_extrude3 = extrude(amount=-CUT_EXTRUDE3_DEPTH, mode=Mode.SUBTRACT)

    # LPattern2: Cut-Extrude1, Cut-Extrude2, Cut-Extrude3 ×5
    with Locations(*[(i * LPATTERN2_PITCH, 0, 0) for i in range(1, LPATTERN2_COUNT)]):
        add(cut_extrude1, mode=Mode.SUBTRACT)
        add(cut_extrude2, mode=Mode.SUBTRACT)
        add(cut_extrude3, mode=Mode.SUBTRACT)

    # Sketch6 → Cut-Extrude4 (cut, symmetric)
    with BuildSketch(Plane(origin=(0, 0, 0), x_dir=(1, 0, 0), z_dir=(0, 1, 0))):
        with BuildLine():
            Line((2.814249456, 3.1), (5.185750544, 3.1))
            ThreePointArc((5.185750544, 3.1), (5.553697029, 2.856892908), (5.474391514, 2.423076923))
            ThreePointArc((5.474391514, 2.423076923), (4.5, 0), (5.474391514, -2.423076923))
            ThreePointArc((5.474391514, -2.423076923), (5.553697029, -2.856892908), (5.185750544, -3.1))
            Line((5.185750544, -3.1), (2.814249456, -3.1))
            ThreePointArc((2.814249456, -3.1), (2.446302971, -2.856892908), (2.525608486, -2.423076923))
            ThreePointArc((2.525608486, -2.423076923), (3.5, 0), (2.525608486, 2.423076923))
            ThreePointArc((2.525608486, 2.423076923), (2.446302971, 2.856892908), (2.814249456, 3.1))
        make_face()
    cut_extrude4 = extrude(amount=CUT_EXTRUDE4_DEPTH, both=True, mode=Mode.SUBTRACT)

    # LPattern3: Cut-Extrude4 ×4
    with Locations(*[(i * LPATTERN3_PITCH, 0, 0) for i in range(1, LPATTERN3_COUNT)]):
        add(cut_extrude4, mode=Mode.SUBTRACT)


solid = part.part
